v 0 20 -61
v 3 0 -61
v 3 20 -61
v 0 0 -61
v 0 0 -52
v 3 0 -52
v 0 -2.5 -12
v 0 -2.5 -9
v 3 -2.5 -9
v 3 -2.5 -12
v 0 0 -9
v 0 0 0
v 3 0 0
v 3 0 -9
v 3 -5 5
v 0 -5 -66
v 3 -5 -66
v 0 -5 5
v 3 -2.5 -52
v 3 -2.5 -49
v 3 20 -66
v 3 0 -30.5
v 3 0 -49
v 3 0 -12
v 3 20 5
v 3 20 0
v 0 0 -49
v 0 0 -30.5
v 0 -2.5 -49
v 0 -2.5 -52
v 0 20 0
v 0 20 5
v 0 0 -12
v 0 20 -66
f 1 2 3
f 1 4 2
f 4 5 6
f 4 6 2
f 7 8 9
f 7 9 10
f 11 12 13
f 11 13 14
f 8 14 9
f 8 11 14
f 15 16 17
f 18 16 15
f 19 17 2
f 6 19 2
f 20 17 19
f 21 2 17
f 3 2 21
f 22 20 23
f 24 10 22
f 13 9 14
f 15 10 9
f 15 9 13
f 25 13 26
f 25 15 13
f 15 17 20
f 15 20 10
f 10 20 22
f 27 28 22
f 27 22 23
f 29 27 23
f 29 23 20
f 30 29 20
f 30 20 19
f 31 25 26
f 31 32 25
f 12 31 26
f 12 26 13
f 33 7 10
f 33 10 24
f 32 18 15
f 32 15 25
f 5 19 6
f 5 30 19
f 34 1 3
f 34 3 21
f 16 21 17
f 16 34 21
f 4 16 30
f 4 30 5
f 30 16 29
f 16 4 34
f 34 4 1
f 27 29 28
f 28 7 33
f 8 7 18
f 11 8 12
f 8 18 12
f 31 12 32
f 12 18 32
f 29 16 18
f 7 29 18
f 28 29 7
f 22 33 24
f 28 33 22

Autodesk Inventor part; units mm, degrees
ref_plane "YZ Plane" through (0, 0, 0) normal (1, 0, 0) x (0, 1, 0)
ref_plane "XZ Plane" through (0, 0, 0) normal (0, 1, 0) x (-1, 0, 0)
ref_plane "XY Plane" through (0, 0, 0) normal (0, 0, 1) x (1, 0, 0)
sketch "Sketch1" plane through (0, 0, 0) normal (1, 0, 0) x (0, 1, 0)
  line L0 (0, 0) -> (0, -61)
  line L1 (0, -61) -> (20, -61)
  line L2 (20, -61) -> (20, -66)
  line L3 (20, -66) -> (-5, -66)
  line L4 (-5, -66) -> (-5, 5)
  line L5 (-5, 5) -> (20, 5)
  line L6 (20, 5) -> (20, 0)
  line L7 (20, 0) -> (0, 0)
  line L8 (0, -30.5) -> (0, -10.5)
  line L9 (0, -30.5) -> (0, -50.5)
  line L10 (0, -10.5) -> (0, -9)
  line L11 (0, -9) -> (-2.5, -9)
  line L12 (-2.5, -9) -> (-2.5, -12)
  line L13 (-2.5, -12) -> (0, -12)
  line L14 (0, -12) -> (0, -9)
  line L15 (0, -50.5) -> (0, -49)
  line L16 (0, -49) -> (-2.5, -49)
  line L17 (-2.5, -49) -> (-2.5, -52)
  line L18 (-2.5, -52) -> (0, -52)
  line L19 (0, -52) -> (0, -49)
  point P0 (0, -52)
  dimension "d0" = 61
  dimension "d1" = 20
  dimension "d2" = 5
  dimension "d3" = 25
  dimension "d4" = 71
  dimension "d7" = 20
  dimension "d8" = 20
  dimension "d9" = 1.5
  dimension "d10" = 2.5
  dimension "d11" = 3
  dimension "d12" = 1.5
  dimension "d13" = 2.5
  dimension "d14" = 3
extrude "Extrusion1" add sketch "Sketch1" along normal blind 3 contours L0 L11 L12 L13 L16 L17 L18 L1 L2 L3 L4 L5 L6 L7
properties part number "CONTAINERHOUDER LANG"
